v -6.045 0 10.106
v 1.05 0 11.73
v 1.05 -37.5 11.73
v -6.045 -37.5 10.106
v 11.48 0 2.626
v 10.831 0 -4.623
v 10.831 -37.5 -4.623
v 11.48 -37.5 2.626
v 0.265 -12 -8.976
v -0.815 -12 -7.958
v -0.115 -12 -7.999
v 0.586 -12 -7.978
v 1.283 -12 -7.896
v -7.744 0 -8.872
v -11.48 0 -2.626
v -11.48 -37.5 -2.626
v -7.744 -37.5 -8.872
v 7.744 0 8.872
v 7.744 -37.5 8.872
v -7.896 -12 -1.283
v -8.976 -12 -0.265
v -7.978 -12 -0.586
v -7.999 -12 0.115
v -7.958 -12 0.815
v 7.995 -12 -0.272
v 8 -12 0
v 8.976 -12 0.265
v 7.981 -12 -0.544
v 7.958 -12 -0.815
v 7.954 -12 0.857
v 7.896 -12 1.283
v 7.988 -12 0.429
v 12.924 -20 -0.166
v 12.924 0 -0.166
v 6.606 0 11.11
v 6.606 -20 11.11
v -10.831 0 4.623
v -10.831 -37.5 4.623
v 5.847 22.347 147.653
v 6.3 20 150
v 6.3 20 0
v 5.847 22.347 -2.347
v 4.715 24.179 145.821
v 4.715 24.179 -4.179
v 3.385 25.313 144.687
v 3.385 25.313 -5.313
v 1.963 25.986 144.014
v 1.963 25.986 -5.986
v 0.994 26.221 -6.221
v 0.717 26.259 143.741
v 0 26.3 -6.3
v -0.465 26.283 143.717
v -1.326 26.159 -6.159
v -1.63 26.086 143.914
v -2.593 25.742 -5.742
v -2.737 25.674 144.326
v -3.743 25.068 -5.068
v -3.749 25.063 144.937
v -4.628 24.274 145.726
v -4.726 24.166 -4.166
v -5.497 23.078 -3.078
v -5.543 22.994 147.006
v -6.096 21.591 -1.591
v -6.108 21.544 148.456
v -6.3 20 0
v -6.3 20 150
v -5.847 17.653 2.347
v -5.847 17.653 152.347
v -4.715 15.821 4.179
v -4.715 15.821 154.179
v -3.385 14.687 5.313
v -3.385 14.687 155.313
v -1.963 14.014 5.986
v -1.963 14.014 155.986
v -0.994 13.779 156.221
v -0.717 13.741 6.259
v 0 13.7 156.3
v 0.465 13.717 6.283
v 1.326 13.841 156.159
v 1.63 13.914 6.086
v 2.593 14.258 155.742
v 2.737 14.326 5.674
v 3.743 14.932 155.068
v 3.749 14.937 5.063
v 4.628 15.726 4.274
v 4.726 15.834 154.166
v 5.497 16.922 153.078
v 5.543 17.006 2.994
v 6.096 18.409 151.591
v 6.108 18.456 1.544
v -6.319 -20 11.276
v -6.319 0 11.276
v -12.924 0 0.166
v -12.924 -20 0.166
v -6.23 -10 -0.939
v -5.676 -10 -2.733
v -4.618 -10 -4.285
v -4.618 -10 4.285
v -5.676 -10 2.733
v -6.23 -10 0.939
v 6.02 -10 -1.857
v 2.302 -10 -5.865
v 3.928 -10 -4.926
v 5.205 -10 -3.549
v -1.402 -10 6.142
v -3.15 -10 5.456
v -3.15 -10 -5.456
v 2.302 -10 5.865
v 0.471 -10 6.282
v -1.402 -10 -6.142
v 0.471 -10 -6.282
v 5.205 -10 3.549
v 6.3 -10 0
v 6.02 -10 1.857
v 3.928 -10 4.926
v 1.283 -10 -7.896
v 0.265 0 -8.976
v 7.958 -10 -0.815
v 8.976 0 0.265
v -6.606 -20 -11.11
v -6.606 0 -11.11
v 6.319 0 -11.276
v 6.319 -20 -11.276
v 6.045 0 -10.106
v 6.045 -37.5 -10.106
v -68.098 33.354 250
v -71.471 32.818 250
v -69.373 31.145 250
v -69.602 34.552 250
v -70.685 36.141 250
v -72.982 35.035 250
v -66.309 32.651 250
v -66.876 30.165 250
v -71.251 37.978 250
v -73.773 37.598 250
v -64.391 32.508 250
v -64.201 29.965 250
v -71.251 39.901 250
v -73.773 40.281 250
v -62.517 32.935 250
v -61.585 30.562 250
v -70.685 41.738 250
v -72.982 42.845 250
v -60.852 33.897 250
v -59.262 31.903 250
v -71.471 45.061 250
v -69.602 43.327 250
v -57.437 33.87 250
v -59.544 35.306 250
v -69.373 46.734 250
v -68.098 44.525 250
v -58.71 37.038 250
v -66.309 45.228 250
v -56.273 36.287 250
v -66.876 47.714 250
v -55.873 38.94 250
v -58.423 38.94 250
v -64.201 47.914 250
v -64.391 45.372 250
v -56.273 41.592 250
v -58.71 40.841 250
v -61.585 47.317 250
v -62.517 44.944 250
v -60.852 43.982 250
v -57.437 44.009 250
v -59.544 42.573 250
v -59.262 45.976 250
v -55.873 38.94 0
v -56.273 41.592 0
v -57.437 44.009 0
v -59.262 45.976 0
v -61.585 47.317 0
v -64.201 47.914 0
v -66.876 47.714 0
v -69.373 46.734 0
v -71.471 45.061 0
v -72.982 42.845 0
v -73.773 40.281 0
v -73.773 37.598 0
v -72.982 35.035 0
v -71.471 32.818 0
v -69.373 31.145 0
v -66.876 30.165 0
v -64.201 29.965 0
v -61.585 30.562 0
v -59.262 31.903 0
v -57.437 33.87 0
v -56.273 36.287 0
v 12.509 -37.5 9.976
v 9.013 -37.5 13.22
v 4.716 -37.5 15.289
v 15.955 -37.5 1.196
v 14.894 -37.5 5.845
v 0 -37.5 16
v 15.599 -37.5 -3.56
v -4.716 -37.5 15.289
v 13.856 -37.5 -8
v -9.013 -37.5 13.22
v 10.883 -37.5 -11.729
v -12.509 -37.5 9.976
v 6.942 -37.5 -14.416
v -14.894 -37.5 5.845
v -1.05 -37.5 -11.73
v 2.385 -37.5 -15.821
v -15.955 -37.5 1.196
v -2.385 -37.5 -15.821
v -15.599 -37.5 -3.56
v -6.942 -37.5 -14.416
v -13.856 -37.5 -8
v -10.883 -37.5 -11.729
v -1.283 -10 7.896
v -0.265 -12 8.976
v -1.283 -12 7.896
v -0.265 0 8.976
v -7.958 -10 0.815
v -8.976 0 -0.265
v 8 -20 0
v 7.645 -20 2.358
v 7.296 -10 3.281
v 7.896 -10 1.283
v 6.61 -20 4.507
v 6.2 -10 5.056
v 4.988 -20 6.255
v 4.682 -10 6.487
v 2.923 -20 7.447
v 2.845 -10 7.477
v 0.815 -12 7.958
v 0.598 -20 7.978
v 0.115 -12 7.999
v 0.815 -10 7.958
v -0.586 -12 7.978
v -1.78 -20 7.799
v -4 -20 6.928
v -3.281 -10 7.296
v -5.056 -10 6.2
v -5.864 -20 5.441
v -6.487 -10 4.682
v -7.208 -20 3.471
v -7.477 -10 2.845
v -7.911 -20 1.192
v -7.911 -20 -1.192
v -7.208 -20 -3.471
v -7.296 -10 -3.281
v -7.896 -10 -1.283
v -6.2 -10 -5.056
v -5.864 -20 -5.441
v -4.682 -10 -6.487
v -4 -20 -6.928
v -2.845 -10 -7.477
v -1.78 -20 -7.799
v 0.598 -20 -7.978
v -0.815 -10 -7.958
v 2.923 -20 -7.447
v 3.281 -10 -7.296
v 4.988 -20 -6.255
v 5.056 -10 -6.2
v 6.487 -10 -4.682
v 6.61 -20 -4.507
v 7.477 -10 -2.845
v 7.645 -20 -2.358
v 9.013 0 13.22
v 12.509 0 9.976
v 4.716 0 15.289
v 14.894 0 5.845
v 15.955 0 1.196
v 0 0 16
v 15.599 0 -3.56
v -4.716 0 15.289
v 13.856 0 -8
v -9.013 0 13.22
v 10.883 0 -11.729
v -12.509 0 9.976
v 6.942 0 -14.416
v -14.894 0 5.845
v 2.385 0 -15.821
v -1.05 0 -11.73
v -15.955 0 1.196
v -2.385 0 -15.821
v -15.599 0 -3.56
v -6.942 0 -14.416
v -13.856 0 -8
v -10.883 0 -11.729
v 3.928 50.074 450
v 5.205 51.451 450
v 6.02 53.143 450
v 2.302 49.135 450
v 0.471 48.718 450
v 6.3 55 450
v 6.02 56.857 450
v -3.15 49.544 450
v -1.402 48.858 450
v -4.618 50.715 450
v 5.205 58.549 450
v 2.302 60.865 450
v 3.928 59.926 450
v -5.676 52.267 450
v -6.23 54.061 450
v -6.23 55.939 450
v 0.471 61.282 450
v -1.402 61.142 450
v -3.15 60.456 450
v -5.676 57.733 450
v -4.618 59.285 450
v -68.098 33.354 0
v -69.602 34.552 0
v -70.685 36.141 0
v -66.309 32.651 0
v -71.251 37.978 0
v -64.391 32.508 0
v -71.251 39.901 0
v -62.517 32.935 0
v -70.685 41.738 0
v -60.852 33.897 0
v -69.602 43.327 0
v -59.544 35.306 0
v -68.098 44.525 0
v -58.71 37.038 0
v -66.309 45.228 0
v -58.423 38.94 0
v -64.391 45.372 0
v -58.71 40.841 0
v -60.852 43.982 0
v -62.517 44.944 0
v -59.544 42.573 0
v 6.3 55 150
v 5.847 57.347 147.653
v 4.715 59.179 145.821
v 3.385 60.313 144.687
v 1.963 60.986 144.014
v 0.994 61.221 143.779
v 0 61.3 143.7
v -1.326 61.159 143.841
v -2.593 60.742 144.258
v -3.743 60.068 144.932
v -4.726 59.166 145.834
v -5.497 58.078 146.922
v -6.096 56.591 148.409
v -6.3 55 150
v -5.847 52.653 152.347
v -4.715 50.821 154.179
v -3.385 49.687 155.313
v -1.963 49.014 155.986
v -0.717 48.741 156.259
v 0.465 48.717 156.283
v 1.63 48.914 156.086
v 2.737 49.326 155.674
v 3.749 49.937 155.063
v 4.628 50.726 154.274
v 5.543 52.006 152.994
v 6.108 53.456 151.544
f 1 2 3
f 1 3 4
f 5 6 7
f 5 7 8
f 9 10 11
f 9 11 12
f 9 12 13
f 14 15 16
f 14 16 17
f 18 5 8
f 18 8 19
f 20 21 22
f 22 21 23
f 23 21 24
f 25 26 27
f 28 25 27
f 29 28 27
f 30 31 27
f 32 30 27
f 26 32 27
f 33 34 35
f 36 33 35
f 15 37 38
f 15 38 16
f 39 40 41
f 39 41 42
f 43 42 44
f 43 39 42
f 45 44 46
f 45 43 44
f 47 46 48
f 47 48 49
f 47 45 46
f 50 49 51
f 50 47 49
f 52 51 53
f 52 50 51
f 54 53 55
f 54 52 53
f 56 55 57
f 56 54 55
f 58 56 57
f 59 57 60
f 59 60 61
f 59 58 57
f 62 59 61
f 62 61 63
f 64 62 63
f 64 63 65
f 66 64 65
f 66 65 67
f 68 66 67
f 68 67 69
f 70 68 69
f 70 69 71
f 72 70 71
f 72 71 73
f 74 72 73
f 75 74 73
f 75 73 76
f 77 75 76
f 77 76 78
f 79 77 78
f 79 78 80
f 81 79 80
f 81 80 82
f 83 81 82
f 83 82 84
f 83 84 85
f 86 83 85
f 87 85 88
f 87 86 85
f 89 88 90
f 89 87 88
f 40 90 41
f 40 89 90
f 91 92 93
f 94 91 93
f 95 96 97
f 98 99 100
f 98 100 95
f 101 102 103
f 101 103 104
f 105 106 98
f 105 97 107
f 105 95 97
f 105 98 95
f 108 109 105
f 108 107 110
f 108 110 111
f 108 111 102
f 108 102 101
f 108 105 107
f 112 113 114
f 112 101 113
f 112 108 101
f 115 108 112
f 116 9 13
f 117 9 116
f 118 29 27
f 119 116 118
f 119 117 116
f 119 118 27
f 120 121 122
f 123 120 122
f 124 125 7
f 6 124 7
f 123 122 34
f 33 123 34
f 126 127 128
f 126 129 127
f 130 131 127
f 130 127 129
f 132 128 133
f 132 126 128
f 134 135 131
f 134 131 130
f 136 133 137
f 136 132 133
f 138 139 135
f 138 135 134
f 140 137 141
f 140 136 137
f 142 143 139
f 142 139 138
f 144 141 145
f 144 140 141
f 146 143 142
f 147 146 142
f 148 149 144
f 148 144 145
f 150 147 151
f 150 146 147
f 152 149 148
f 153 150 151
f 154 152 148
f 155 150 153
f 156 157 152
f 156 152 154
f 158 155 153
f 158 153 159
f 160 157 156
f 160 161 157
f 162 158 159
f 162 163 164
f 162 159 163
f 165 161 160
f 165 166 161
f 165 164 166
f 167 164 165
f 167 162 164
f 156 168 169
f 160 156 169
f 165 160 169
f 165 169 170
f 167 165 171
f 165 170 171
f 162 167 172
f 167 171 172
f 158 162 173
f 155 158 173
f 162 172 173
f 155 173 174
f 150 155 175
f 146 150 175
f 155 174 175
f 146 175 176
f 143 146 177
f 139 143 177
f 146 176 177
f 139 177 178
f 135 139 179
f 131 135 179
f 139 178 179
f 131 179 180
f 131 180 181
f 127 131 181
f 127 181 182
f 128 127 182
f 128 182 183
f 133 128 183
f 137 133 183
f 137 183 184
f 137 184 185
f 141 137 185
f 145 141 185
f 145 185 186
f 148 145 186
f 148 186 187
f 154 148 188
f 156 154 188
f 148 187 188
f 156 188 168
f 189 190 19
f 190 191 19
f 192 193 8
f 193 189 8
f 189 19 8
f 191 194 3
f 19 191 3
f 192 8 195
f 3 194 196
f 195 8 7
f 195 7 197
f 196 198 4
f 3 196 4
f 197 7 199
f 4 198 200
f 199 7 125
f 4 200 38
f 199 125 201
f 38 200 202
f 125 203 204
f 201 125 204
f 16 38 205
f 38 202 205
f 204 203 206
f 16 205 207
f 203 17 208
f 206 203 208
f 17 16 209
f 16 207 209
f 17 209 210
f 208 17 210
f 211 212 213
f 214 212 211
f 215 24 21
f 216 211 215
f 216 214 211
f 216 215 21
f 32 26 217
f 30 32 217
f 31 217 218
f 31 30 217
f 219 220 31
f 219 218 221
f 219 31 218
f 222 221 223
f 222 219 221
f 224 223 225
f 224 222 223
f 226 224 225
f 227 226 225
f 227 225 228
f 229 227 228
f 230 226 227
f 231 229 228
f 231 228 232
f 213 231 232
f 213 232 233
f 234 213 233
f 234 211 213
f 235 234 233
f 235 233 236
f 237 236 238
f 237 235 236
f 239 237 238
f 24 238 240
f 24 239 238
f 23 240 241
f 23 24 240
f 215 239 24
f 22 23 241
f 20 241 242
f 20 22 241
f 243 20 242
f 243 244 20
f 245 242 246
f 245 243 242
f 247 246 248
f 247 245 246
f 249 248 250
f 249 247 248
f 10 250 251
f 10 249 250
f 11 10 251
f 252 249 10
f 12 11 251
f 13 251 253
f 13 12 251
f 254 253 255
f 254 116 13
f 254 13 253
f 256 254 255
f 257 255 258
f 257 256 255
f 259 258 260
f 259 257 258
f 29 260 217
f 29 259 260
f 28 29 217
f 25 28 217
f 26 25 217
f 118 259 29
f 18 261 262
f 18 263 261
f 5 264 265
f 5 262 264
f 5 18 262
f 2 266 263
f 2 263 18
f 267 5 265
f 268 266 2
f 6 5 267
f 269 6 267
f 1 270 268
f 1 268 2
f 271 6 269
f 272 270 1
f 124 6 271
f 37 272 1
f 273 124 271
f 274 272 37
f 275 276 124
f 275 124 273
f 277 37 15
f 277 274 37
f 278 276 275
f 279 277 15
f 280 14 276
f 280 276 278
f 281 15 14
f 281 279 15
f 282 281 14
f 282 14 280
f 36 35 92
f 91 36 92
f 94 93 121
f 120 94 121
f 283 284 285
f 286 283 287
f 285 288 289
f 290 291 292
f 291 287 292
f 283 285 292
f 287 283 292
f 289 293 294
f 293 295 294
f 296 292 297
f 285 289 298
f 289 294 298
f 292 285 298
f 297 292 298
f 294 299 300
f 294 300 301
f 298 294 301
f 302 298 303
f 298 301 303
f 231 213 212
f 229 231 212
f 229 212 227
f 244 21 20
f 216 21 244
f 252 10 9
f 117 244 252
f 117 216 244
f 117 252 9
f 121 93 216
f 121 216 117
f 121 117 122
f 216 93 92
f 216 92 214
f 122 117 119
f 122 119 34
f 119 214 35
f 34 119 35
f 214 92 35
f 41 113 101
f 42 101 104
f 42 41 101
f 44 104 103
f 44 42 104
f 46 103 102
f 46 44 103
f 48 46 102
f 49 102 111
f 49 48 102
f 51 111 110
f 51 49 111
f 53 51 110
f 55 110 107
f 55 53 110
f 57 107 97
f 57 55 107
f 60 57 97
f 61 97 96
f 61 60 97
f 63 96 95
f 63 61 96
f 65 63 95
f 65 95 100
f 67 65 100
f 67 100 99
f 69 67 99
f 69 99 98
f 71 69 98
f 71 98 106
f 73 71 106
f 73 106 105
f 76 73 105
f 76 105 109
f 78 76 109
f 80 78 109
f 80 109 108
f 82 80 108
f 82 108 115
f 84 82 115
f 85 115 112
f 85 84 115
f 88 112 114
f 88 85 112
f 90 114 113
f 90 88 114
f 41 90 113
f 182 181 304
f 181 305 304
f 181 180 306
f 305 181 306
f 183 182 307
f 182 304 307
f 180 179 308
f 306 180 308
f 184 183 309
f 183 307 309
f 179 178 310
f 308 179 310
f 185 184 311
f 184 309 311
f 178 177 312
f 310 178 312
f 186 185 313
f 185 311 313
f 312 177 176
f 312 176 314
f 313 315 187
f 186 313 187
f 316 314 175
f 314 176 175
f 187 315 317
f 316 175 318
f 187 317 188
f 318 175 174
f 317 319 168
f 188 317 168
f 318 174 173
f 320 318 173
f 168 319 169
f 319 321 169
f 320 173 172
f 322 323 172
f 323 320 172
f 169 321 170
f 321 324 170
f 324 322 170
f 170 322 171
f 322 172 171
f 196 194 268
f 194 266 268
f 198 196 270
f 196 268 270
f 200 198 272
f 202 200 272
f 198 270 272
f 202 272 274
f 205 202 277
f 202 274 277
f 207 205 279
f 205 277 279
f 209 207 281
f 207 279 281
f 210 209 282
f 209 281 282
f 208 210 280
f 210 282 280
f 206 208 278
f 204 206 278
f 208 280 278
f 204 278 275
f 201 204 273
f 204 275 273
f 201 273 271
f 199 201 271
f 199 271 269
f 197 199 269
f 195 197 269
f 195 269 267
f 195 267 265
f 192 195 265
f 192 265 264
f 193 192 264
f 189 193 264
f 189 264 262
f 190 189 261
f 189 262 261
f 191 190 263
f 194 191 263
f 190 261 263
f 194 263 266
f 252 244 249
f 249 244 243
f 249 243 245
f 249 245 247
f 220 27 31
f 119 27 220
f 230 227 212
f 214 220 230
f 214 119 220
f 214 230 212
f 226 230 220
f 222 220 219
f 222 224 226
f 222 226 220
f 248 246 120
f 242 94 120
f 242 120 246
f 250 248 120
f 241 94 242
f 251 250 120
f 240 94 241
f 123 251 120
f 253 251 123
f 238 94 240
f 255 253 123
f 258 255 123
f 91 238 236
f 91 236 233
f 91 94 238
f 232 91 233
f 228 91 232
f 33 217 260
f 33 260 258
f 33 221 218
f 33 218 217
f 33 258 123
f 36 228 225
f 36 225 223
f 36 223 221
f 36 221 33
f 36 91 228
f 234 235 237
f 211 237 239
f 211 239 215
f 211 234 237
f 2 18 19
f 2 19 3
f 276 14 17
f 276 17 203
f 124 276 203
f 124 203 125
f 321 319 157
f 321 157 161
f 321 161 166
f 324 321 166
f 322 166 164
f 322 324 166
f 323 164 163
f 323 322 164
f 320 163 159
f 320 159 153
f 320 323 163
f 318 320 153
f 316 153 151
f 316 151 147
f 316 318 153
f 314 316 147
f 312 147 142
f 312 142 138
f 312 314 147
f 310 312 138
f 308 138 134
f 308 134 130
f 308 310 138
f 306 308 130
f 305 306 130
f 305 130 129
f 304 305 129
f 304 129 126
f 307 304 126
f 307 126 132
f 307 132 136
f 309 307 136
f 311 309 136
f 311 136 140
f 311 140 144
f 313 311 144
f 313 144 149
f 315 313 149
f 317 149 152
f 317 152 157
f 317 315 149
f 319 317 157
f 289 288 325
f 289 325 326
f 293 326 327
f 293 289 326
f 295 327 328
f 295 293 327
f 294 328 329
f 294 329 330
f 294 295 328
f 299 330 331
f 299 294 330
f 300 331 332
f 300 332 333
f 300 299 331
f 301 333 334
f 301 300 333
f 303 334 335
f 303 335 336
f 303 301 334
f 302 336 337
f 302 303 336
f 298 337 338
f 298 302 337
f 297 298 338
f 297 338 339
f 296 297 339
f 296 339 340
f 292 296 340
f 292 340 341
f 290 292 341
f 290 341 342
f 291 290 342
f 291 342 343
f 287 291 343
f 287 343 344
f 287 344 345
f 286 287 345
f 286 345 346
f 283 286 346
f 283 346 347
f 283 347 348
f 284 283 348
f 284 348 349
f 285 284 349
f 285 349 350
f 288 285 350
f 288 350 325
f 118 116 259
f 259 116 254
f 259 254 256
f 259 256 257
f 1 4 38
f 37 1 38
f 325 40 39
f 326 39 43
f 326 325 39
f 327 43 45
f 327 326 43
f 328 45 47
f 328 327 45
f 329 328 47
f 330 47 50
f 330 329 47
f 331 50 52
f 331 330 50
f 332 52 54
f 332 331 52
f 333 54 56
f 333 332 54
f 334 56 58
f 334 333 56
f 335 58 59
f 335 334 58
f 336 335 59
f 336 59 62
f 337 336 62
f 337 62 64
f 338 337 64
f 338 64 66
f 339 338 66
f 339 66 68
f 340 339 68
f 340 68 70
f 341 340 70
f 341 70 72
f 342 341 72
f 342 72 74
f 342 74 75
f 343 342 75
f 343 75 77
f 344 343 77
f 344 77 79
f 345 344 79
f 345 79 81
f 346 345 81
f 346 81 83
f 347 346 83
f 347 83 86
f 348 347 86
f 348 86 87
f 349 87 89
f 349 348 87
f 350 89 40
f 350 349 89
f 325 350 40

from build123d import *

# Parameters (mm, degrees)
F0_W      = 37.5
F0_H      = 16
F3_DEPTH  = 37.5
F5_DEPTH  = 20
F6_R      = 8
F7_DEPTH  = 30
F8_R      = 8
F9_DEPTH  = 10
F11_DEPTH = 12
F12_R     = 6.3
F13_DEPTH = 10
F16_R     = 9
F16_R_2   = 6.45
F17_DEPTH = 250


with BuildPart() as f1:
    # F0 (on Right) → F1 (revolve)
    with BuildSketch(Plane.YZ):
        with Locations((-18.75, 8)):
            Rectangle(F0_W, F0_H)
    revolve(axis=Axis((0, -18.75, 0), (0, -1, 0)))

    # F2 (on Front) → F3 (cut)
    with BuildSketch(Plane.XZ):
        Polygon((6.045373429, -10.1062610923), (10.8311210673, -4.6227556271), (11.4797485941, 2.626485366), (7.7435023403, 8.8724982202), (1.0495013844, 11.7295183194), (-6.045373429, 10.1062610923), (-10.8311210673, 4.6227556271), (-11.4797485941, -2.626485366), (-7.7435023403, -8.8724982202), (-1.0495013844, -11.7295183194), align=None)
    extrude(amount=F3_DEPTH, mode=Mode.SUBTRACT)


with BuildPart() as f5:
    # F4 (on Front) → F5 (new body)
    with BuildSketch(Plane.XZ):
        Polygon((-6.6055527024, -11.1098621268), (6.3186464831, -11.2755075097), (12.9241991855, -0.1656453829), (6.6055527024, 11.1098621268), (-6.3186464831, 11.2755075097), (-12.9241991855, 0.1656453829), align=None)
    extrude(amount=F5_DEPTH)

    # F6 (on Front) → F7 (cut)
    with BuildSketch(Plane.XZ):
        Circle(F6_R)
    extrude(amount=F7_DEPTH, mode=Mode.SUBTRACT)

    # F8 (on Front) → F9 (join)
    with BuildSketch(Plane.XZ):
        Circle(F8_R)
    extrude(amount=F9_DEPTH)

    # F10 (on Front) → F11 (cut)
    with BuildSketch(Plane.XZ):
        Polygon((0.264718855, -8.9763535986), (8.9763535986, 0.264718855), (-0.264718855, 8.9763535986), (-8.9763535986, -0.264718855), align=None)
    extrude(amount=F11_DEPTH, mode=Mode.SUBTRACT)


with BuildPart() as f13:
    # F12 (on Front) → F13 (new body)
    with BuildSketch(Plane.XZ):
        Circle(F12_R)
    extrude(amount=F13_DEPTH)

    # F15: sweep along a path in F14
    with BuildLine(Plane.YZ) as f15_path:
        Line((0, 0), (20, 0))
        Line((20, 0), (20, 150))
        Line((20, 150), (55, 150))
        Line((55, 150), (55, 450))
    # F12 (on Front) → F15 (sweep)
    with BuildSketch(Plane.XZ):
        Circle(F12_R)
    sweep(path=f15_path.line, transition=Transition.RIGHT)


with BuildPart() as f17:
    # F16 (on Top) → F17 (new body)
    with BuildSketch(Plane.XY):
        with Locations((-64.8733526468, 38.939550519)):
            Circle(F16_R)
        with Locations((-64.8733526468, 38.939550519)):
            Circle(F16_R_2, mode=Mode.SUBTRACT)
    extrude(amount=F17_DEPTH)


solid = Compound([f1.part, f5.part, f13.part, f17.part])
